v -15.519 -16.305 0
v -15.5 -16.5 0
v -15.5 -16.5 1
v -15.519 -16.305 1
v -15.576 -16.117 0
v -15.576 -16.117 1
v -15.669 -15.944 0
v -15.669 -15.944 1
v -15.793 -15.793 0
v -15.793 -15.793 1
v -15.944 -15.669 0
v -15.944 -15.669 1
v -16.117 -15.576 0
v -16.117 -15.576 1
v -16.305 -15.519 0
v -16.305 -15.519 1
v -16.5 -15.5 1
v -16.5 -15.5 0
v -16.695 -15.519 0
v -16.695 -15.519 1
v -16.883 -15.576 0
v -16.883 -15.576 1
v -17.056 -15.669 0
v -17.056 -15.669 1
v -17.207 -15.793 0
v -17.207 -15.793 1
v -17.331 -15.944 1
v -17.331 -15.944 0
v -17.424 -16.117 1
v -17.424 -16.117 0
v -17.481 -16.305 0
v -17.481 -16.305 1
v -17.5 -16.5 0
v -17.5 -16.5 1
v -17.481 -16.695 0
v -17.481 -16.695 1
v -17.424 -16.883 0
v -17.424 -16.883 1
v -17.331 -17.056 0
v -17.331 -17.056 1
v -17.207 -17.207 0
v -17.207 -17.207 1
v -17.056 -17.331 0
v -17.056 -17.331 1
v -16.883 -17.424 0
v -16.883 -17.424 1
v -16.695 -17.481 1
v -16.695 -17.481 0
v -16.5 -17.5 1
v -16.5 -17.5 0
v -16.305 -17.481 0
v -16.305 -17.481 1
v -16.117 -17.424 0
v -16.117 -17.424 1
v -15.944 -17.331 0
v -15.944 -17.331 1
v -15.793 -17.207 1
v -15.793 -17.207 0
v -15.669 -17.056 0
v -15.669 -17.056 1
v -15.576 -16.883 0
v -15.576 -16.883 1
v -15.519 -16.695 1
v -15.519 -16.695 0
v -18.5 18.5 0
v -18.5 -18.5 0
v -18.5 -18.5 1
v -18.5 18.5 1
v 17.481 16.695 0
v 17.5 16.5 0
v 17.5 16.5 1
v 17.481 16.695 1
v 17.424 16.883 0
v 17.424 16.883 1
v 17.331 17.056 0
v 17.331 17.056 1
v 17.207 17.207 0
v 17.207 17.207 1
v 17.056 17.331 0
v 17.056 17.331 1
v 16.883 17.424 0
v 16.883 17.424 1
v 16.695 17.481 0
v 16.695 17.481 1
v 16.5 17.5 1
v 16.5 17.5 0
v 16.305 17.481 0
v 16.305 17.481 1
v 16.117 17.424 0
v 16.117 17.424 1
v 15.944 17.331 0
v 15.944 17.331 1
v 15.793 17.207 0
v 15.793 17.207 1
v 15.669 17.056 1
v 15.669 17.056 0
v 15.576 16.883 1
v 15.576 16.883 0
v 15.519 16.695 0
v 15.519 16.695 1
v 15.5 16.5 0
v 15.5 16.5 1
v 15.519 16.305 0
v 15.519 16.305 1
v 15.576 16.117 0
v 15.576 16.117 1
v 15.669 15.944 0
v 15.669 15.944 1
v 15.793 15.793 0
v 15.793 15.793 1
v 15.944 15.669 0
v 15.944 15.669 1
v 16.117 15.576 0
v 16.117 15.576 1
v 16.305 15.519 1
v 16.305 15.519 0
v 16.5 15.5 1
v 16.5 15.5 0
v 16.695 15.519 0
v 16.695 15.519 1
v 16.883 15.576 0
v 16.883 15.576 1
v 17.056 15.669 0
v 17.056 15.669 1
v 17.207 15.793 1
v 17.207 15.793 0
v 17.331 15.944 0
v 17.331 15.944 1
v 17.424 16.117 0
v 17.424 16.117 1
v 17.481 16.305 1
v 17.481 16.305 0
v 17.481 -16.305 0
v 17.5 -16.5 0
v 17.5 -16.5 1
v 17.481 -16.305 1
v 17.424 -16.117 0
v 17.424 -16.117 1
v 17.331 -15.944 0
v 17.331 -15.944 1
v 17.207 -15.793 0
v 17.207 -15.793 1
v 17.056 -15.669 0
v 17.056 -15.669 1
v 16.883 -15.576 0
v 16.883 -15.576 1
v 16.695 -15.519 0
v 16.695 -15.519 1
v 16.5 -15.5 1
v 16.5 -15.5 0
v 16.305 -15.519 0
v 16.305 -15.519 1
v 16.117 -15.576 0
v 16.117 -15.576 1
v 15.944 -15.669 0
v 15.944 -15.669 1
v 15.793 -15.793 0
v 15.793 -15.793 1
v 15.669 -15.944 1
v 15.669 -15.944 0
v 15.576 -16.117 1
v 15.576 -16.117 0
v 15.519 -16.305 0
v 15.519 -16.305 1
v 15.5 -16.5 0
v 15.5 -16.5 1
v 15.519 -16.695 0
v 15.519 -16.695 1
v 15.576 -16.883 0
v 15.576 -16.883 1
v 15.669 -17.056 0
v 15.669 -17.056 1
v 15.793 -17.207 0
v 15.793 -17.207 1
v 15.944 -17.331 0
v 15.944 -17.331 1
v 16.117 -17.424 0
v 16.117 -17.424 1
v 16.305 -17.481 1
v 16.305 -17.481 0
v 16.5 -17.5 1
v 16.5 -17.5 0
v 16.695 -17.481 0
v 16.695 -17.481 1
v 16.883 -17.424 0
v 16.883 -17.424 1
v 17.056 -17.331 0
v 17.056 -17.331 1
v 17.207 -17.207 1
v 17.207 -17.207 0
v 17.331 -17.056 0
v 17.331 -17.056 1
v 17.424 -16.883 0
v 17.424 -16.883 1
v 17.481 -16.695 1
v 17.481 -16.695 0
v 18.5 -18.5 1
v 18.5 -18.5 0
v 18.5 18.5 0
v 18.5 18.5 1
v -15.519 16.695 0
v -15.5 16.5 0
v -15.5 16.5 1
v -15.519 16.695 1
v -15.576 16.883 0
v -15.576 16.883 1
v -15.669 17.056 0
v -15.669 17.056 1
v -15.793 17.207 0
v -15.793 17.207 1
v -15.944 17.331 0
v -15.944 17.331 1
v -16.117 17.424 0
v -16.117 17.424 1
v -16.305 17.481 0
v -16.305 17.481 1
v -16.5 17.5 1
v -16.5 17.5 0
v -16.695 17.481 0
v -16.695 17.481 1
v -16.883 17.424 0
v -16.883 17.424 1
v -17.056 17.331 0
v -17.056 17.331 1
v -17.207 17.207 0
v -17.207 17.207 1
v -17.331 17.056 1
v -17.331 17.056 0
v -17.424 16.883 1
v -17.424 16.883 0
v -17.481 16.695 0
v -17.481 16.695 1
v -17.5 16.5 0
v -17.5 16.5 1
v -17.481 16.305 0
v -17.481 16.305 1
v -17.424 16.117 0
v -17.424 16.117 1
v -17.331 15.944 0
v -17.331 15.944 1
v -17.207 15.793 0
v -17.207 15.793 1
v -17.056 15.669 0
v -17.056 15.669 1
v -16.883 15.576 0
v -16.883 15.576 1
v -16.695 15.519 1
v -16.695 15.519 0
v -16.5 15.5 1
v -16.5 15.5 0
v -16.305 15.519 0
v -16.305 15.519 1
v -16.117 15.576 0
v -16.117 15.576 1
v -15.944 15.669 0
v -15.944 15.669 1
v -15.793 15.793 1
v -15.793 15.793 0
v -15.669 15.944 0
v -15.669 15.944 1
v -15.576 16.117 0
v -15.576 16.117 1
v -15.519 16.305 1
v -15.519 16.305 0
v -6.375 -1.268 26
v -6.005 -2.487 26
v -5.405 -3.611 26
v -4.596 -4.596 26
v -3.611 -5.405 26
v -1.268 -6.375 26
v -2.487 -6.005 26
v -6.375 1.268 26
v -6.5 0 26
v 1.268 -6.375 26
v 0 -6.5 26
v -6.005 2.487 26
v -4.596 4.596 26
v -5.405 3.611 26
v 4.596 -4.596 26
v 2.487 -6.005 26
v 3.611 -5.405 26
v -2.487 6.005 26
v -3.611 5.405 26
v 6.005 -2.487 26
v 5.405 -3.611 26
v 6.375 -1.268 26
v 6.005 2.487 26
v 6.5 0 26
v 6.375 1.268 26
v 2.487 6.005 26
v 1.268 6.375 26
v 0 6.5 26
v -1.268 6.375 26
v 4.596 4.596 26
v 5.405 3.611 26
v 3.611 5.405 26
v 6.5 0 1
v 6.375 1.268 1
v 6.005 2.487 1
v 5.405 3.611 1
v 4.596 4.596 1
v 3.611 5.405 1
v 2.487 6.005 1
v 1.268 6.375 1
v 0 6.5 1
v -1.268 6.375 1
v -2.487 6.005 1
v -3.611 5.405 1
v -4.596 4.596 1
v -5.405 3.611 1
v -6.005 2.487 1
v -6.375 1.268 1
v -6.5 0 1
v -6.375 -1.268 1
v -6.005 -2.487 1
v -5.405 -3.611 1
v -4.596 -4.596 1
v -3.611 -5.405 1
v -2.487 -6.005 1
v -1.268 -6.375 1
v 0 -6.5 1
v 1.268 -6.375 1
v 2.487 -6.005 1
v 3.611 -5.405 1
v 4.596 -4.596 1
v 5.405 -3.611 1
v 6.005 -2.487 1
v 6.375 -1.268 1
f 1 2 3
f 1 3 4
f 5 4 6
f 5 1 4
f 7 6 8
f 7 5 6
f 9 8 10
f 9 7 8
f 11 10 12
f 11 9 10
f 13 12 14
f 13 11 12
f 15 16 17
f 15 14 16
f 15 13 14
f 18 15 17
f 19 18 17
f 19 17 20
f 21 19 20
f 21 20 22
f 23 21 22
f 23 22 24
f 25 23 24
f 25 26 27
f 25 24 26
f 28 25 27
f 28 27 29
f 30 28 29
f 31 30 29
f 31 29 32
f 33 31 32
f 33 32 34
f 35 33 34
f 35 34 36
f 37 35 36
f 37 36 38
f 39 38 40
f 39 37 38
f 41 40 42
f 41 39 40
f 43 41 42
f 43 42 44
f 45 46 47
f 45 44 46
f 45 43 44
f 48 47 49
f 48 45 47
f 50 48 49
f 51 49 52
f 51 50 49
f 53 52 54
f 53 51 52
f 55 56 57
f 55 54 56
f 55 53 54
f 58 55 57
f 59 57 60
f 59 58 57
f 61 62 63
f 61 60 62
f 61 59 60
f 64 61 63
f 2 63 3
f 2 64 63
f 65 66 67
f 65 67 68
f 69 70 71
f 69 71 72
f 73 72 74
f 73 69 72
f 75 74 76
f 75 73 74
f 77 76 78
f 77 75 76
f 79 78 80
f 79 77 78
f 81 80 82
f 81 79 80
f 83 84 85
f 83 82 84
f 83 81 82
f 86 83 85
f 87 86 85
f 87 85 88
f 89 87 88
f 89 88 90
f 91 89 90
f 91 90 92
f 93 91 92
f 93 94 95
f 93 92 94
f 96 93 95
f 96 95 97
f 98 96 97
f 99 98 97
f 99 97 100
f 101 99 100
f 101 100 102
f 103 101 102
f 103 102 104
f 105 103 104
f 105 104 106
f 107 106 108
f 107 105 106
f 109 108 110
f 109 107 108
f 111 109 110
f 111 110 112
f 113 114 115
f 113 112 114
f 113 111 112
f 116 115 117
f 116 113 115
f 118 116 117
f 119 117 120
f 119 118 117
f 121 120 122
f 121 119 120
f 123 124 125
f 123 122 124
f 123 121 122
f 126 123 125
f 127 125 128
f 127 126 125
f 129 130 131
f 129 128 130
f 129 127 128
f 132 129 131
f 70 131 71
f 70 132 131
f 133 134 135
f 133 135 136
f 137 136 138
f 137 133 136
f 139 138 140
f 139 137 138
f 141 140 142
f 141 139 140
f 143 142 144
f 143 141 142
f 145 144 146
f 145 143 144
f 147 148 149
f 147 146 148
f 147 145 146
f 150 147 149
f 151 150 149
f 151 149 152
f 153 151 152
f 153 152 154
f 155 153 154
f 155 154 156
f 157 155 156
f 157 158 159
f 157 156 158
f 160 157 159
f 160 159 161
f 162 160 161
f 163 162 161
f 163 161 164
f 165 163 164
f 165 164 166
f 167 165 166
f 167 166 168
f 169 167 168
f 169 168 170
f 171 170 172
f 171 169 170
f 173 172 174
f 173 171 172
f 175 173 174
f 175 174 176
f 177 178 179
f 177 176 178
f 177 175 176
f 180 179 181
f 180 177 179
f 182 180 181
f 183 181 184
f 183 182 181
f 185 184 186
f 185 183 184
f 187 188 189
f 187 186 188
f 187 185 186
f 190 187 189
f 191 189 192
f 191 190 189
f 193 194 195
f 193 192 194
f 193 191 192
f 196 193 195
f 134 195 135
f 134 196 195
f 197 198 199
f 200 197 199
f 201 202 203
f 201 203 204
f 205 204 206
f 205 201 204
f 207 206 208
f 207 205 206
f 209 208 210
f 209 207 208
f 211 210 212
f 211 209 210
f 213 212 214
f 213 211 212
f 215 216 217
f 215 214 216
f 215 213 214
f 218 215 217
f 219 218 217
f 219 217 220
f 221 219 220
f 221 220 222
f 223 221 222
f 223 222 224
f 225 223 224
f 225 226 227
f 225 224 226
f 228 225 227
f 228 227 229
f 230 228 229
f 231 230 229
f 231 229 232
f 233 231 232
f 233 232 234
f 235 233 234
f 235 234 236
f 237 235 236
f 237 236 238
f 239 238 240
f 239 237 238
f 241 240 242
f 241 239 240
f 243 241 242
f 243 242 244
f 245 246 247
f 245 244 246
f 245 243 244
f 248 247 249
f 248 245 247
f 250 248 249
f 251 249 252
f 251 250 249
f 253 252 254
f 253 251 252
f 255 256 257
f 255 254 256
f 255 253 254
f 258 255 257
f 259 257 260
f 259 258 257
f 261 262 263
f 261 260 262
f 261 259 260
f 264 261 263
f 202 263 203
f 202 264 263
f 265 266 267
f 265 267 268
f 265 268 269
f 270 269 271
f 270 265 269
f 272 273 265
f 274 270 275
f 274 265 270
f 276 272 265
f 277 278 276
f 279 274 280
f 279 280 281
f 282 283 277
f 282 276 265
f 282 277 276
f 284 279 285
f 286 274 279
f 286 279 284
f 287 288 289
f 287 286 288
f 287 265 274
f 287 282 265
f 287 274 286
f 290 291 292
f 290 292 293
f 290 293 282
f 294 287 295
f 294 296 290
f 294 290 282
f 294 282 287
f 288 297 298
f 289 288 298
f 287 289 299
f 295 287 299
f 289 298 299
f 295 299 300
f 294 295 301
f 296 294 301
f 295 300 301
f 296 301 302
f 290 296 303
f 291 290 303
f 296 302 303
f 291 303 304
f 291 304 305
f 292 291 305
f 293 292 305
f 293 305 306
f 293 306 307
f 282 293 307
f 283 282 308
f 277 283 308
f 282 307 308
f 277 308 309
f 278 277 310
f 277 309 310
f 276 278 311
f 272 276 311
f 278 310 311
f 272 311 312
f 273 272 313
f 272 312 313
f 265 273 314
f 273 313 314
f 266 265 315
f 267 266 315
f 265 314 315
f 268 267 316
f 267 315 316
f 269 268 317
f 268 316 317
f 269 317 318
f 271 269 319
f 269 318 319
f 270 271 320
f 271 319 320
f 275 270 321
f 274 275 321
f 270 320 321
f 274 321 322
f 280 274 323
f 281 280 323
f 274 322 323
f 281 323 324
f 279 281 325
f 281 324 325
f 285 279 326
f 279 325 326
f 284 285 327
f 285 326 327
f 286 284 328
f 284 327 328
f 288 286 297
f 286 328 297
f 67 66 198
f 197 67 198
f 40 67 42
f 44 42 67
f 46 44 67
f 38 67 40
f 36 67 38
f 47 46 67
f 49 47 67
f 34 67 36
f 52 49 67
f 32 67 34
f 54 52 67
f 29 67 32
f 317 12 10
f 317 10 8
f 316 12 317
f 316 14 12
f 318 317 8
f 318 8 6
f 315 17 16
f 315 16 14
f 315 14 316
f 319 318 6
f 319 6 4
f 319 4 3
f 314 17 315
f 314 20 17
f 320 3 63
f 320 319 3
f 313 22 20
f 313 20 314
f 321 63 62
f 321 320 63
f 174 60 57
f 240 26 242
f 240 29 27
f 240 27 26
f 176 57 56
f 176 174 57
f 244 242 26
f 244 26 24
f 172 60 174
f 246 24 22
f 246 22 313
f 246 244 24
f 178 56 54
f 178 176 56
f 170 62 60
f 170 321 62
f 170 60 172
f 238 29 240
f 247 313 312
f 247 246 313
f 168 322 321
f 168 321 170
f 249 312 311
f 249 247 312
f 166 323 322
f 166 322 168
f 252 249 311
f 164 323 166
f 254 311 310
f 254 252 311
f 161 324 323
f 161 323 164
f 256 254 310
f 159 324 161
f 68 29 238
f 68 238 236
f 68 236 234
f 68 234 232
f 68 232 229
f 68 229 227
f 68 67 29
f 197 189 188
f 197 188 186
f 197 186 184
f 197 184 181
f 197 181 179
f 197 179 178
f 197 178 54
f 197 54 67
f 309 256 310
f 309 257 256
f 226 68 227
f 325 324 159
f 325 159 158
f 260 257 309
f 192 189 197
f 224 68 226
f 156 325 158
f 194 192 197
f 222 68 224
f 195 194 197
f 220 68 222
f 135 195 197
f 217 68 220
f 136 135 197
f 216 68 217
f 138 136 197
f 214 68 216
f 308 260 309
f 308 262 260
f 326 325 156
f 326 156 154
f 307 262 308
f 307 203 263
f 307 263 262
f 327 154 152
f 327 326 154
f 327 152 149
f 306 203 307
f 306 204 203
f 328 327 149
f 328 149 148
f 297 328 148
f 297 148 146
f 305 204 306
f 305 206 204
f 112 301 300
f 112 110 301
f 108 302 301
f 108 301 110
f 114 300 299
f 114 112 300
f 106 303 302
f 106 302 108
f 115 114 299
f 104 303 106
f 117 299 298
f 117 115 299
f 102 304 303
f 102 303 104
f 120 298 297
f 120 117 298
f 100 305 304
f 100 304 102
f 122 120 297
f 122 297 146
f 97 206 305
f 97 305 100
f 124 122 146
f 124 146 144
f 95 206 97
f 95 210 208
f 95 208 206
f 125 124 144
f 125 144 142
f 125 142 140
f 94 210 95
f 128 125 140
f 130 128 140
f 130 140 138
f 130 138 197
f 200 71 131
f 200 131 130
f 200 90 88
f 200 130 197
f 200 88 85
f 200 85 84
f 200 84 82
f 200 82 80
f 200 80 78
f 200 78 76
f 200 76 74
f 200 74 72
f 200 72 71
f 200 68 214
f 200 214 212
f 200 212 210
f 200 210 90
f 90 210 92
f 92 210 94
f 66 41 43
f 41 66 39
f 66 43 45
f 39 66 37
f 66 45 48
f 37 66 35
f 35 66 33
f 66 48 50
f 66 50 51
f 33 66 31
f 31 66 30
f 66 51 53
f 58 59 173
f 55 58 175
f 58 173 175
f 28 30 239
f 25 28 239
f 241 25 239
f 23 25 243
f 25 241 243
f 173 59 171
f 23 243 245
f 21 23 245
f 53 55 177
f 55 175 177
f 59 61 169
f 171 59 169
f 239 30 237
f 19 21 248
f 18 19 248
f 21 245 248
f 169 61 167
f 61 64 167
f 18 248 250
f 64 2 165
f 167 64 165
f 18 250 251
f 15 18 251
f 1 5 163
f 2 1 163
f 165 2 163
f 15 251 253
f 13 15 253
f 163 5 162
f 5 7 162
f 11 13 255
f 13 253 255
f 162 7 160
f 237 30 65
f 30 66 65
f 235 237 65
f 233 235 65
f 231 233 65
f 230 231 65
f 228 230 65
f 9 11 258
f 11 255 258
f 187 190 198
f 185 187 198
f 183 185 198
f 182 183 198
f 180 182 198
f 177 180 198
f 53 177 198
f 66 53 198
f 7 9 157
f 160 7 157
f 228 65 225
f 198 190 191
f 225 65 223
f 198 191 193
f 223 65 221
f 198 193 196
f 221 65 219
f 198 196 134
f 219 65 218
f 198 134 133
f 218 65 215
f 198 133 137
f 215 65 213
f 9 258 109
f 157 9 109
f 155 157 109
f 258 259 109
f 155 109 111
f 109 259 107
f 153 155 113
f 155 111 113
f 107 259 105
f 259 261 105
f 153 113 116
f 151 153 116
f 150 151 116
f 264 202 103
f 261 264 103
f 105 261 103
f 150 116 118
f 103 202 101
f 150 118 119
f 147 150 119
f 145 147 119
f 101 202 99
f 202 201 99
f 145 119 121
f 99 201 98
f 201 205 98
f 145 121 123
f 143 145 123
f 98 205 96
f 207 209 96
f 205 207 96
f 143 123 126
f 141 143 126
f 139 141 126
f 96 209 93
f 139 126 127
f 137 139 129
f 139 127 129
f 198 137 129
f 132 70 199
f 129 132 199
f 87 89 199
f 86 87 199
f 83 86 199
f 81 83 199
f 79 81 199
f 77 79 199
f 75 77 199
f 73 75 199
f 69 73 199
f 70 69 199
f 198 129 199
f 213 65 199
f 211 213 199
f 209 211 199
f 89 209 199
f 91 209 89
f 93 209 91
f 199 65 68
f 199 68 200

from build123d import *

# Parameters (mm, degrees)
MEASURED_PCB_37X37_W                                = 37
MEASURED_PCB_37X37_H                                = 37
PCB_VISUAL_THICKNESS_1MM_UNMEASURED_DEPTH           = 1
LENS_HEIGHT25_FROM_PCB_FRONT_START                  = 1
LENS_OD13_CENTER_PROVISIONAL_R                      = 6.5
LENS_HEIGHT25_FROM_PCB_FRONT_DEPTH                  = 25
FOUR_MEASURED_D2_HOLES_PROVISIONAL_LOCAT_DEPTH      = 37.884956283
FOUR_MEASURED_D2_HOLES_PROVISIONAL_LOCAT_DEPTH_BACK = 37.884956283
HOLE_CENTERS33_PROVISIONAL_R                        = 1


with BuildPart() as part:
    # Measured_PCB_37x37 → PCB_visual_thickness_1mm_UNMEASURED (new body)
    with BuildSketch(Plane.XY):
        Rectangle(MEASURED_PCB_37X37_W, MEASURED_PCB_37X37_H)
    extrude(amount=PCB_VISUAL_THICKNESS_1MM_UNMEASURED_DEPTH)

    # Lens_OD13_center_PROVISIONAL → Lens_height25_from_PCB_front (add)
    with BuildSketch(Plane.XY.offset(LENS_HEIGHT25_FROM_PCB_FRONT_START)):
        Circle(LENS_OD13_CENTER_PROVISIONAL_R)
    extrude(amount=LENS_HEIGHT25_FROM_PCB_FRONT_DEPTH)

    # Hole_centers33_PROVISIONAL → Four_measured_D2_holes_PROVISIONAL_locations (cut, two sides: drawn at the far end of the back side and taken through both)
    with BuildSketch(Plane.XY.offset(-FOUR_MEASURED_D2_HOLES_PROVISIONAL_LOCAT_DEPTH_BACK)):
        with Locations((-16.5, -16.5)):
            Circle(HOLE_CENTERS33_PROVISIONAL_R)
        with Locations((-16.5, 16.5)):
            Circle(HOLE_CENTERS33_PROVISIONAL_R)
        with Locations((16.5, -16.5)):
            Circle(HOLE_CENTERS33_PROVISIONAL_R)
        with Locations((16.5, 16.5)):
            Circle(HOLE_CENTERS33_PROVISIONAL_R)
    extrude(amount=FOUR_MEASURED_D2_HOLES_PROVISIONAL_LOCAT_DEPTH + FOUR_MEASURED_D2_HOLES_PROVISIONAL_LOCAT_DEPTH_BACK, mode=Mode.SUBTRACT)


solid = part.part
